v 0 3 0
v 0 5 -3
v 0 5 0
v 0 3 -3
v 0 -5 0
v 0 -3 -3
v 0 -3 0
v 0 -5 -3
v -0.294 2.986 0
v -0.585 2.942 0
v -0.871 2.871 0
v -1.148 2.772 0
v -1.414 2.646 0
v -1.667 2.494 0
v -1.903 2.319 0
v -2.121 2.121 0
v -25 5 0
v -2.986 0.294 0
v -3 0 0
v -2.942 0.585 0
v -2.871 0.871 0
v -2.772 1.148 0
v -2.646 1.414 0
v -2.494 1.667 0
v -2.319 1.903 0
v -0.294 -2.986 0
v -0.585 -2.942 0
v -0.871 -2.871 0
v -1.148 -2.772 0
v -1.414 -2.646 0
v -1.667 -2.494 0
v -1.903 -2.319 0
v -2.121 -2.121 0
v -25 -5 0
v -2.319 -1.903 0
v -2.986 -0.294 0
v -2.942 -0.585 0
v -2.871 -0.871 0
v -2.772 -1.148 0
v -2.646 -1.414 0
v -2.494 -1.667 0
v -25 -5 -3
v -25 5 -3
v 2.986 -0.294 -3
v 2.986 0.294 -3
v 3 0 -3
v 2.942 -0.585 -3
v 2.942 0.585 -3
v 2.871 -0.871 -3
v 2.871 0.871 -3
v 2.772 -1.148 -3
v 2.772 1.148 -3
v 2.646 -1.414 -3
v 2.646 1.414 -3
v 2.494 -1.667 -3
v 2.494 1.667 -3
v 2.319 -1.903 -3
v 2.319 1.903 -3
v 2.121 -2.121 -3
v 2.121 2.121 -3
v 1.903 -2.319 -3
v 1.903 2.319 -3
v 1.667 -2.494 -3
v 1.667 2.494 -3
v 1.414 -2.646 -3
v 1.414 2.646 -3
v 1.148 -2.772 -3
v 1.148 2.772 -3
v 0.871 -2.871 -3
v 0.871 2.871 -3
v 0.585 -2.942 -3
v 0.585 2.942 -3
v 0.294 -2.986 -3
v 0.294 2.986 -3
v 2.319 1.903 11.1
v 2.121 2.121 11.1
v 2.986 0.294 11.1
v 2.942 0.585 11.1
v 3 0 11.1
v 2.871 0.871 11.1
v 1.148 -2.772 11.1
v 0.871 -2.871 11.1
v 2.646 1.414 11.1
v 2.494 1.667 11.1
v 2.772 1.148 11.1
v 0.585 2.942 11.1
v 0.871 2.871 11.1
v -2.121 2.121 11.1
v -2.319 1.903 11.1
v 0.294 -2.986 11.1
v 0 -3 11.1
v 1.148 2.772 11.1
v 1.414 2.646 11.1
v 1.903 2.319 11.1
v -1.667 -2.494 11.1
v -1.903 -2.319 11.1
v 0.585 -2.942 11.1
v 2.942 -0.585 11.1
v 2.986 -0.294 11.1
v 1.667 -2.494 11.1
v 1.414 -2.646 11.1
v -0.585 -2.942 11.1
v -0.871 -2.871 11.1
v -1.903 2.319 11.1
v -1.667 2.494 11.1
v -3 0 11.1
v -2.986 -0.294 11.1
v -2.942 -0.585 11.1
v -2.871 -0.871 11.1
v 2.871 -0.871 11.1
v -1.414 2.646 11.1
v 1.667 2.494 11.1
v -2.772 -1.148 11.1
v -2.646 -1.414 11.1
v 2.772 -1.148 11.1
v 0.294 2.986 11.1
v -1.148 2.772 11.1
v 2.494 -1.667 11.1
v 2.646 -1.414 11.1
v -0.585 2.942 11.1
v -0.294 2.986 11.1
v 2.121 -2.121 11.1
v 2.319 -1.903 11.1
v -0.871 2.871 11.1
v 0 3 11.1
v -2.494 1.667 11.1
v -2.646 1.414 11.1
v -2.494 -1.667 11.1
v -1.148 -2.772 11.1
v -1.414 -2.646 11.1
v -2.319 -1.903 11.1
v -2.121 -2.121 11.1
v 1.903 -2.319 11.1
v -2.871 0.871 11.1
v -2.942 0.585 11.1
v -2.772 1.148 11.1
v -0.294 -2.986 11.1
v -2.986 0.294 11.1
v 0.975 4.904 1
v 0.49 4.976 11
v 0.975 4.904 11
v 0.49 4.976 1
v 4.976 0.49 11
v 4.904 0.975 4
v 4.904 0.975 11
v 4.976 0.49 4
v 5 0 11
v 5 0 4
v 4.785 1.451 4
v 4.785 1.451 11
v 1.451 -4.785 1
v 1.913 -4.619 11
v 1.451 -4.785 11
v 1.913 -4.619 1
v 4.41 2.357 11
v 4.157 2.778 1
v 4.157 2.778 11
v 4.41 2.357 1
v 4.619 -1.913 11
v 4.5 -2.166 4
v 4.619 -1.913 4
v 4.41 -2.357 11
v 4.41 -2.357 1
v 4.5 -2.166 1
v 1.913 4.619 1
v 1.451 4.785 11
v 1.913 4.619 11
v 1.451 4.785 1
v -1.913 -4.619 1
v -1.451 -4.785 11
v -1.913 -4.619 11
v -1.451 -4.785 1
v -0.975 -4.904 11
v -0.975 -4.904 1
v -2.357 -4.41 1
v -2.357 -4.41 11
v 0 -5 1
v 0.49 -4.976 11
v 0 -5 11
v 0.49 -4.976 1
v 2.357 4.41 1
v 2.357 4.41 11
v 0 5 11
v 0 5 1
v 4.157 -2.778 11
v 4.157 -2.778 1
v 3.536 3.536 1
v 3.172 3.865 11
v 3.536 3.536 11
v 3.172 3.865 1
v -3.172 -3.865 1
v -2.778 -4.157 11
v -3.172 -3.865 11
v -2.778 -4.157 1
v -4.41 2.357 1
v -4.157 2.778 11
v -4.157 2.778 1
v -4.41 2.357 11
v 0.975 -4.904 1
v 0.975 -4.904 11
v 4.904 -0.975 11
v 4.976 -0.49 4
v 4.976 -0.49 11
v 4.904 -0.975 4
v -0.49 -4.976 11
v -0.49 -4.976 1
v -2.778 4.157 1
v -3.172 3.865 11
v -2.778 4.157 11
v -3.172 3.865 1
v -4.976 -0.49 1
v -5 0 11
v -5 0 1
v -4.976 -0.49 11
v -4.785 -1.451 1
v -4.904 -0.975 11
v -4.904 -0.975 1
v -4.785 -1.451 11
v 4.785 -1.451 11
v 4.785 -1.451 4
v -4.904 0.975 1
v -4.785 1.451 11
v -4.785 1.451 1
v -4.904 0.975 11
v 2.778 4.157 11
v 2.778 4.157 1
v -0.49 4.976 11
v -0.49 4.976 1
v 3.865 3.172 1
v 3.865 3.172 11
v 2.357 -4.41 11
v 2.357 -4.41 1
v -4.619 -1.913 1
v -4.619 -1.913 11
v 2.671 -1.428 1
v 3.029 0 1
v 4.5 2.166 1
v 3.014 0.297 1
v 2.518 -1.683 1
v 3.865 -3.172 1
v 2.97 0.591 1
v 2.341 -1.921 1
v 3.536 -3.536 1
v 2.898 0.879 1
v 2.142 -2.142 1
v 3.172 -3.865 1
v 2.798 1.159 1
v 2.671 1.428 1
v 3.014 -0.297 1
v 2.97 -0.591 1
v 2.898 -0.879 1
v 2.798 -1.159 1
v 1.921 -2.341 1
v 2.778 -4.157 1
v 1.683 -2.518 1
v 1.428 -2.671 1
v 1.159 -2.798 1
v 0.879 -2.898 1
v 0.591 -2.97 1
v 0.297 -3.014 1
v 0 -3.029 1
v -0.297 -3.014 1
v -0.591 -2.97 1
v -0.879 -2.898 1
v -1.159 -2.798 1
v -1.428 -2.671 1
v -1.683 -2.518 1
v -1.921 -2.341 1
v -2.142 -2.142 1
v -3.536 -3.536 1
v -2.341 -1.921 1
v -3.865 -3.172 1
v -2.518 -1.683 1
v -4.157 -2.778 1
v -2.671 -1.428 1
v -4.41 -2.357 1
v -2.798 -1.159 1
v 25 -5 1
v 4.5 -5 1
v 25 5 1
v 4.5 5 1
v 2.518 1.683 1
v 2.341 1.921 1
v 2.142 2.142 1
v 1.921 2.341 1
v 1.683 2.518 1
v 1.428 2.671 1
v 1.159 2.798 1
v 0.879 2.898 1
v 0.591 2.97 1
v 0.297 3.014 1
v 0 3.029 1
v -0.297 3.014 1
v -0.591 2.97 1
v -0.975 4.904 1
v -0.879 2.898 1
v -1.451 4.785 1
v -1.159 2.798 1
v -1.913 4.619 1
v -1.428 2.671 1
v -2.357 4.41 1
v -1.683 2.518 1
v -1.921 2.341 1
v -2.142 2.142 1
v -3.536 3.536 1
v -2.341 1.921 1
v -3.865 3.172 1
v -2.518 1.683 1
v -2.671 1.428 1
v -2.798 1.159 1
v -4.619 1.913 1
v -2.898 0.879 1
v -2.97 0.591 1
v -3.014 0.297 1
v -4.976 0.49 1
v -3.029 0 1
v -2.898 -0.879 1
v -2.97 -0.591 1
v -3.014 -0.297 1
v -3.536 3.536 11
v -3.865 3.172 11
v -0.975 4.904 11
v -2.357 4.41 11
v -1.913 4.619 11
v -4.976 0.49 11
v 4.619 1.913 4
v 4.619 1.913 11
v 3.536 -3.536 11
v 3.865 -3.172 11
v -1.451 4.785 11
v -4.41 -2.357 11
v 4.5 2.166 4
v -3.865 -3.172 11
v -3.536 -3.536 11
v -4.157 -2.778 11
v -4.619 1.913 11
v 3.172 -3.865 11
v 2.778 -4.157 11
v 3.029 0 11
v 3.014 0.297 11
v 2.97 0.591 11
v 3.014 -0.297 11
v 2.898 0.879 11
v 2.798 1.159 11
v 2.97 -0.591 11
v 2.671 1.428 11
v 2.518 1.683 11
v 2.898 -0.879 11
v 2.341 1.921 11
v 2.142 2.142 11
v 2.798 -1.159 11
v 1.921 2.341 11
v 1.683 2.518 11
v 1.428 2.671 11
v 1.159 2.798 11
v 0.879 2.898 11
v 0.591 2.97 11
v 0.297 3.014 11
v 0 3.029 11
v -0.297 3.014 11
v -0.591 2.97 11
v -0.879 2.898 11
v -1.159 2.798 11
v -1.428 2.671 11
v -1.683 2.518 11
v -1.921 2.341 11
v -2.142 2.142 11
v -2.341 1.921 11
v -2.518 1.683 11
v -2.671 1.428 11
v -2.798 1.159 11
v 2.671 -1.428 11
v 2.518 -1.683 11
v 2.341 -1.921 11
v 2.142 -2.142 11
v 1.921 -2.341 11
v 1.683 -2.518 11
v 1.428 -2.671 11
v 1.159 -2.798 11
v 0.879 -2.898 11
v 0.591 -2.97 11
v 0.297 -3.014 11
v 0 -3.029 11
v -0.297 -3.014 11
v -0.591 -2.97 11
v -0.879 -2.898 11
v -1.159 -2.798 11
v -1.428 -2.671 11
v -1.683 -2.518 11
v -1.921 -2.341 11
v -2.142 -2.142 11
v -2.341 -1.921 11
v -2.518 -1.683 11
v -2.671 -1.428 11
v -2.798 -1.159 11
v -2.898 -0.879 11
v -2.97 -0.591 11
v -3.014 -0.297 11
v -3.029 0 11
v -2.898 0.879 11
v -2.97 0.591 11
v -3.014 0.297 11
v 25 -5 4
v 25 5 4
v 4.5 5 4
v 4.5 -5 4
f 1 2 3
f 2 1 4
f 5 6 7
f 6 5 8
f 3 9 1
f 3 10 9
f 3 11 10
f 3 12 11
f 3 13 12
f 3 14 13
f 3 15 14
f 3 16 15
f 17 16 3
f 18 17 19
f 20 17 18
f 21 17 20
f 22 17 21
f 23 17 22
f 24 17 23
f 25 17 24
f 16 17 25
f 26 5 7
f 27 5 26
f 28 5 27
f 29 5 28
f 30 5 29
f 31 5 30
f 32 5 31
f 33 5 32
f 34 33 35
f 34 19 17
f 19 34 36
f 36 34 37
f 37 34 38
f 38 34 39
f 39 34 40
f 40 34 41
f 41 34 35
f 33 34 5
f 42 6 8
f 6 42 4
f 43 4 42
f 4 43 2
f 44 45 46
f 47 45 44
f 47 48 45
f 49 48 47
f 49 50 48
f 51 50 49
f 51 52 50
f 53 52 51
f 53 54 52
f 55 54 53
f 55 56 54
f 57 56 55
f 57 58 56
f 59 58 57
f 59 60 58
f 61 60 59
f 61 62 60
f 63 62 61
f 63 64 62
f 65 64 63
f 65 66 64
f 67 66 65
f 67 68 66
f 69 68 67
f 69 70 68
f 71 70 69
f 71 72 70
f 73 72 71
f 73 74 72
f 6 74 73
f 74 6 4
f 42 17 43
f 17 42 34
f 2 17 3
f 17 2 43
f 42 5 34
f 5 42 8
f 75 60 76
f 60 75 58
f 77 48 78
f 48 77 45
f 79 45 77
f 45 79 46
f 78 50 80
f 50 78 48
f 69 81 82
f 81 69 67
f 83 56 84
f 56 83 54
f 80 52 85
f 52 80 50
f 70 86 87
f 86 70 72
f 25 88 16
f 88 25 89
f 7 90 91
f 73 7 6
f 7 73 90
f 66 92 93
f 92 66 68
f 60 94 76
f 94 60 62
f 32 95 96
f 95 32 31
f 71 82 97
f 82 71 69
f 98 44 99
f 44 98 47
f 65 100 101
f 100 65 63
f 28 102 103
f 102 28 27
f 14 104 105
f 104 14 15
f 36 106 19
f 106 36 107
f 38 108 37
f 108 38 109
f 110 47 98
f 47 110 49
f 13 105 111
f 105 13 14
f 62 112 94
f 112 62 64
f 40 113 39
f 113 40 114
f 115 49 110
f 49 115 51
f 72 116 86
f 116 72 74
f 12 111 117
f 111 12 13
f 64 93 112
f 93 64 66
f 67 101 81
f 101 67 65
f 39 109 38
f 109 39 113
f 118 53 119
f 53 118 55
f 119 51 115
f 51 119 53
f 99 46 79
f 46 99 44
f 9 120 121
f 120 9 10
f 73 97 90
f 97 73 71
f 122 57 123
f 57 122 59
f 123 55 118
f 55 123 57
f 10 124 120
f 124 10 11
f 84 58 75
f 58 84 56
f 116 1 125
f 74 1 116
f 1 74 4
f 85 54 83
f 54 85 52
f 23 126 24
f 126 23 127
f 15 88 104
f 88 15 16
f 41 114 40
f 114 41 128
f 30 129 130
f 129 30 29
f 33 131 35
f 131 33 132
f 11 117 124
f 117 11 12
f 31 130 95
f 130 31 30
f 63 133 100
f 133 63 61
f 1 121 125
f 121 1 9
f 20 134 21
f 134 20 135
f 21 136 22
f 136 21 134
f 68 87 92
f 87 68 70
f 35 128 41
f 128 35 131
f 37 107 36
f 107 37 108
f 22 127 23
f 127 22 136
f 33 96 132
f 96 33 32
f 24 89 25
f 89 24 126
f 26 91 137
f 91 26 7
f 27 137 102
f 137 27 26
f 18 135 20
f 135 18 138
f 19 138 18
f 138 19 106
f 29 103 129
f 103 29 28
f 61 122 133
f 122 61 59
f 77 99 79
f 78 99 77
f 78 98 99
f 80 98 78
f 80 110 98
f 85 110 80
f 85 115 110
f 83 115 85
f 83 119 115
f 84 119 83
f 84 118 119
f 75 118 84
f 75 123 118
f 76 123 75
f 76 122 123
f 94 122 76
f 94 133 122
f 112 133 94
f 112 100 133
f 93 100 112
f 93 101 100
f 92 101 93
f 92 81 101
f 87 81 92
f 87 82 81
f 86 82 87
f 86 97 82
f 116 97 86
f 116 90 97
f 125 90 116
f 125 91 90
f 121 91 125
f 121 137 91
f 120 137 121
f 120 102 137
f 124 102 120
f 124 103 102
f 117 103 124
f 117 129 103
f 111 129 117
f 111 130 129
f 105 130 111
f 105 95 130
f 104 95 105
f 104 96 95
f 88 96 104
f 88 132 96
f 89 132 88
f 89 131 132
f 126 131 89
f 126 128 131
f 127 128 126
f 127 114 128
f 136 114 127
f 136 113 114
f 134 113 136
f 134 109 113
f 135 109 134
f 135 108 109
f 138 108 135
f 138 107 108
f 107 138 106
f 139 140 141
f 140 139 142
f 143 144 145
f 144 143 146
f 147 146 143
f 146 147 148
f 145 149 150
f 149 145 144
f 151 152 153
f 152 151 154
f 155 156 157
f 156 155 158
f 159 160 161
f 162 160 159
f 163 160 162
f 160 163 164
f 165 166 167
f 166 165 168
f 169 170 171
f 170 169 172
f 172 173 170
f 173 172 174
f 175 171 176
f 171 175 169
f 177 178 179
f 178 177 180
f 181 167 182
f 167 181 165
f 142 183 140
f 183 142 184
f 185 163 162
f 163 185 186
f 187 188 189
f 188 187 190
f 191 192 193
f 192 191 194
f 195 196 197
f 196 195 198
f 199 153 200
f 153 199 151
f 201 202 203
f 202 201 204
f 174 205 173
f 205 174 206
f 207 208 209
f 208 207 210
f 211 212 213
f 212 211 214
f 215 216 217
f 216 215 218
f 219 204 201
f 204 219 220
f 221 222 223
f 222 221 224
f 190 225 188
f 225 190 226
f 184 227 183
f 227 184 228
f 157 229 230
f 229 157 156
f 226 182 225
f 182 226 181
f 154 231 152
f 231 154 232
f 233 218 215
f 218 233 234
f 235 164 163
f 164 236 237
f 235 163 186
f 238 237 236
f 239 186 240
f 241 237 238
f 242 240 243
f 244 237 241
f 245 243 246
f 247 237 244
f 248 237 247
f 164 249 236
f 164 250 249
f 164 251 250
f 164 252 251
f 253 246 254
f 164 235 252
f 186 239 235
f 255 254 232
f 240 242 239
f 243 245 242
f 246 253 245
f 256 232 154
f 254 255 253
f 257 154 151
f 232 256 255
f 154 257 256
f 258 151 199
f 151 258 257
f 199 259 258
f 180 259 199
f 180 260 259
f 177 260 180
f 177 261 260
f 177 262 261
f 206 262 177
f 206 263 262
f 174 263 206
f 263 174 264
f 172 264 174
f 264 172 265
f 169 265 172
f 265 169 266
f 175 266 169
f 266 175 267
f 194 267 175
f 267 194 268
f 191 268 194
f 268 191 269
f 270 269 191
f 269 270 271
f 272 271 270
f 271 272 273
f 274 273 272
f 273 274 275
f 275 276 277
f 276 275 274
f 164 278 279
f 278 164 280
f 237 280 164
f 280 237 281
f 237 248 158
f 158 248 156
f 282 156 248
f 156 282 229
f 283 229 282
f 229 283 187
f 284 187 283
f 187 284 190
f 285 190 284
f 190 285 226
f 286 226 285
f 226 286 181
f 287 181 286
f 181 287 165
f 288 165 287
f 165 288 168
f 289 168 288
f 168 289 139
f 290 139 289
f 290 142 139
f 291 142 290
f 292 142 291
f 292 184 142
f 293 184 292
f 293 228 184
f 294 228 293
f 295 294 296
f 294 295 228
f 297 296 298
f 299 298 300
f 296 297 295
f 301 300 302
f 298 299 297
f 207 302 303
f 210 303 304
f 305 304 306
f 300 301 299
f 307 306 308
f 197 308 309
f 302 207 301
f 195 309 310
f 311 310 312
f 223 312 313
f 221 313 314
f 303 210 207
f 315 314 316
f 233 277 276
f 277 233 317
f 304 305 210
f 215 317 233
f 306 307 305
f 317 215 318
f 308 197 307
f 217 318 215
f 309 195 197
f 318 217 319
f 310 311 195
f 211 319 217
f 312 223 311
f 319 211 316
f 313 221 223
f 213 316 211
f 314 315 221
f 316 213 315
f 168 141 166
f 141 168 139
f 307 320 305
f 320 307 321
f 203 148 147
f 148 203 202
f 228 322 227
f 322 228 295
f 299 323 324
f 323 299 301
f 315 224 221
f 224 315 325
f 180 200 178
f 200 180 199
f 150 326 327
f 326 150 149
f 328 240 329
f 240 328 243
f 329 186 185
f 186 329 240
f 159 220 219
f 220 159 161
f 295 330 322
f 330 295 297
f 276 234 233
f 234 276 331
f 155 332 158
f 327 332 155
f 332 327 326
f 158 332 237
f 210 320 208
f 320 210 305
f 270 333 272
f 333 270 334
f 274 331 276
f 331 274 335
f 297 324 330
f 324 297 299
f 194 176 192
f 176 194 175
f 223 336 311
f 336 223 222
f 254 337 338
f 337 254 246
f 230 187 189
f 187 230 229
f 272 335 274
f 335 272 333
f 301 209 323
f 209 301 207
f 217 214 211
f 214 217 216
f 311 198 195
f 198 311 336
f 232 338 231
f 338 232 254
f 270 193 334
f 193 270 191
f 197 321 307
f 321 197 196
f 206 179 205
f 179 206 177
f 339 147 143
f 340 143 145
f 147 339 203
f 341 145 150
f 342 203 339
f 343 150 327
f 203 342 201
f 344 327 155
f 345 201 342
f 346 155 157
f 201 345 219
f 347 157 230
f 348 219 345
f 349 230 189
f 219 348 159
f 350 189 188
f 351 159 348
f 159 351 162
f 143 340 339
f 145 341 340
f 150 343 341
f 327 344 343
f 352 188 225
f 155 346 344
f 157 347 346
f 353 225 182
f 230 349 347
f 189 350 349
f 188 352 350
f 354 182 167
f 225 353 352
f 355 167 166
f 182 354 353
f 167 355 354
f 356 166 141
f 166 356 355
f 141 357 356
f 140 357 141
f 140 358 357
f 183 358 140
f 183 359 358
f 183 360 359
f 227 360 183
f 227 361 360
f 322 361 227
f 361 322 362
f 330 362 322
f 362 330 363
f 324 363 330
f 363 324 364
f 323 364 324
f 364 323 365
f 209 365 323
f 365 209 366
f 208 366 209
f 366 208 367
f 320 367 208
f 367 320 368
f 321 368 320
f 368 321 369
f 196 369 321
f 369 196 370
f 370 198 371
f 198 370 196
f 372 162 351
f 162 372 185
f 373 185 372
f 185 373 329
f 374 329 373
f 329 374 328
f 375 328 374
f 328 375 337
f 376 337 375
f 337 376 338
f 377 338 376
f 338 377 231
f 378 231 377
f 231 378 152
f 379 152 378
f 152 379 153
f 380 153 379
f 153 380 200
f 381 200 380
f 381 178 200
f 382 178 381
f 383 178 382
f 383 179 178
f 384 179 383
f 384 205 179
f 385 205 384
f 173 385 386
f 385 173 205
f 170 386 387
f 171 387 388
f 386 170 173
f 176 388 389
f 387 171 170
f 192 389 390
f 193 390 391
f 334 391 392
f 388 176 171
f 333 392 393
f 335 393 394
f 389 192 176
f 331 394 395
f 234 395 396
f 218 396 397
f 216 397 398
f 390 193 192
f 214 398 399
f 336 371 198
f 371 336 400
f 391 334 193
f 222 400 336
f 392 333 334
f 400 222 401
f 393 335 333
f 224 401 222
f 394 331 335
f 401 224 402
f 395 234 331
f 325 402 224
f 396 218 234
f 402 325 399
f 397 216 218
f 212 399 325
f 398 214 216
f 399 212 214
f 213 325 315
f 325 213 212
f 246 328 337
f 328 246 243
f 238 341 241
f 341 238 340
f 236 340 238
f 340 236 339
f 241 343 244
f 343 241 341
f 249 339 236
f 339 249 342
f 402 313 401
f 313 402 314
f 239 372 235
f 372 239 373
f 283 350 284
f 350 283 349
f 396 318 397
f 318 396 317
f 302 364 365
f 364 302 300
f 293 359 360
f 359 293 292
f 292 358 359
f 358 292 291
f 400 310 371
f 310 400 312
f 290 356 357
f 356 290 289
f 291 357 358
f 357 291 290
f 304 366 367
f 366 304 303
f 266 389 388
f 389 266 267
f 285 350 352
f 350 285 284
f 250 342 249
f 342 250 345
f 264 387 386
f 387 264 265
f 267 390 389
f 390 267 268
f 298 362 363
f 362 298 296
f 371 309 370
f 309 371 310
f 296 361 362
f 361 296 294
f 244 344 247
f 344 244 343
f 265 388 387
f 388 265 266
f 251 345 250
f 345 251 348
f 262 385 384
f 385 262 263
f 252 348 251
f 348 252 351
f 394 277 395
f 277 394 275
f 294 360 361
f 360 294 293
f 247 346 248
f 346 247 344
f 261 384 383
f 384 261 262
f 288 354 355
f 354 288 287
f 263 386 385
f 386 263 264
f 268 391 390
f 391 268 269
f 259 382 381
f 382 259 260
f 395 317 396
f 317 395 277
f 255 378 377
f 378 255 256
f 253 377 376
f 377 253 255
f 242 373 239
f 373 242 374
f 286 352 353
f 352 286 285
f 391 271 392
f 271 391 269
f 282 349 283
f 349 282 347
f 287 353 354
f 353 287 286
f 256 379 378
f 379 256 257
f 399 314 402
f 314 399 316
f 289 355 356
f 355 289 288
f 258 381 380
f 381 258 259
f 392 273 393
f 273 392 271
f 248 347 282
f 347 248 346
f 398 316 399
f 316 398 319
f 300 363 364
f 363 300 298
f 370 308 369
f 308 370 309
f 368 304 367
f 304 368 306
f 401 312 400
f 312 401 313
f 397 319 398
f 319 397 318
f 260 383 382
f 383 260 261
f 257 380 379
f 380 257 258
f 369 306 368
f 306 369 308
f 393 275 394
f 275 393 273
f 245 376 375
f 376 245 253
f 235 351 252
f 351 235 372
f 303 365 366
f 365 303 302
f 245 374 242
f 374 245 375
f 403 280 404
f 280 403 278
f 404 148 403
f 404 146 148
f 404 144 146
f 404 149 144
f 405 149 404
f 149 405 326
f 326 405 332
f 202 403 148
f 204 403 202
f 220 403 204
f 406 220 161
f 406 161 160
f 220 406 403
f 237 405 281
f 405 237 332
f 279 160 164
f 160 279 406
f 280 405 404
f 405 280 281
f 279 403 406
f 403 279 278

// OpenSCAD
// Adversarial: a correct-looking hinge whose bore is simply too small.
// Only the fit should fail; parts, motion and withdrawal are all fine.
// This is the case that separates "a hinge shape" from "the requested fit".
agentscad_part = "all";
hinge_angle = 0;   // pose control: the benchmark re-renders the moving part at this angle
$fn = 64;

bore_d = 6.05 / cos(180 / $fn);

module fixed_leaf() {
  union() {
    translate([-25, -5, -3]) cube([25, 10, 3]);
    translate([0, 0, -3]) cylinder(h = 14.1, d = 6);
  }
}

module moving_leaf() {
  union() {
    difference() {
      translate([0, 0, 1]) cylinder(h = 10, d = 10);
      translate([0, 0, 0.9]) cylinder(h = 10.2, d = bore_d);
    }
    translate([4.5, -5, 1]) cube([20.5, 10, 3]);
  }
}

module generated_part() {
  if (agentscad_part == "all" || agentscad_part == "fixed") fixed_leaf();
  if (agentscad_part == "all" || agentscad_part == "moving") rotate([0, 0, hinge_angle]) moving_leaf();
}

generated_part();
